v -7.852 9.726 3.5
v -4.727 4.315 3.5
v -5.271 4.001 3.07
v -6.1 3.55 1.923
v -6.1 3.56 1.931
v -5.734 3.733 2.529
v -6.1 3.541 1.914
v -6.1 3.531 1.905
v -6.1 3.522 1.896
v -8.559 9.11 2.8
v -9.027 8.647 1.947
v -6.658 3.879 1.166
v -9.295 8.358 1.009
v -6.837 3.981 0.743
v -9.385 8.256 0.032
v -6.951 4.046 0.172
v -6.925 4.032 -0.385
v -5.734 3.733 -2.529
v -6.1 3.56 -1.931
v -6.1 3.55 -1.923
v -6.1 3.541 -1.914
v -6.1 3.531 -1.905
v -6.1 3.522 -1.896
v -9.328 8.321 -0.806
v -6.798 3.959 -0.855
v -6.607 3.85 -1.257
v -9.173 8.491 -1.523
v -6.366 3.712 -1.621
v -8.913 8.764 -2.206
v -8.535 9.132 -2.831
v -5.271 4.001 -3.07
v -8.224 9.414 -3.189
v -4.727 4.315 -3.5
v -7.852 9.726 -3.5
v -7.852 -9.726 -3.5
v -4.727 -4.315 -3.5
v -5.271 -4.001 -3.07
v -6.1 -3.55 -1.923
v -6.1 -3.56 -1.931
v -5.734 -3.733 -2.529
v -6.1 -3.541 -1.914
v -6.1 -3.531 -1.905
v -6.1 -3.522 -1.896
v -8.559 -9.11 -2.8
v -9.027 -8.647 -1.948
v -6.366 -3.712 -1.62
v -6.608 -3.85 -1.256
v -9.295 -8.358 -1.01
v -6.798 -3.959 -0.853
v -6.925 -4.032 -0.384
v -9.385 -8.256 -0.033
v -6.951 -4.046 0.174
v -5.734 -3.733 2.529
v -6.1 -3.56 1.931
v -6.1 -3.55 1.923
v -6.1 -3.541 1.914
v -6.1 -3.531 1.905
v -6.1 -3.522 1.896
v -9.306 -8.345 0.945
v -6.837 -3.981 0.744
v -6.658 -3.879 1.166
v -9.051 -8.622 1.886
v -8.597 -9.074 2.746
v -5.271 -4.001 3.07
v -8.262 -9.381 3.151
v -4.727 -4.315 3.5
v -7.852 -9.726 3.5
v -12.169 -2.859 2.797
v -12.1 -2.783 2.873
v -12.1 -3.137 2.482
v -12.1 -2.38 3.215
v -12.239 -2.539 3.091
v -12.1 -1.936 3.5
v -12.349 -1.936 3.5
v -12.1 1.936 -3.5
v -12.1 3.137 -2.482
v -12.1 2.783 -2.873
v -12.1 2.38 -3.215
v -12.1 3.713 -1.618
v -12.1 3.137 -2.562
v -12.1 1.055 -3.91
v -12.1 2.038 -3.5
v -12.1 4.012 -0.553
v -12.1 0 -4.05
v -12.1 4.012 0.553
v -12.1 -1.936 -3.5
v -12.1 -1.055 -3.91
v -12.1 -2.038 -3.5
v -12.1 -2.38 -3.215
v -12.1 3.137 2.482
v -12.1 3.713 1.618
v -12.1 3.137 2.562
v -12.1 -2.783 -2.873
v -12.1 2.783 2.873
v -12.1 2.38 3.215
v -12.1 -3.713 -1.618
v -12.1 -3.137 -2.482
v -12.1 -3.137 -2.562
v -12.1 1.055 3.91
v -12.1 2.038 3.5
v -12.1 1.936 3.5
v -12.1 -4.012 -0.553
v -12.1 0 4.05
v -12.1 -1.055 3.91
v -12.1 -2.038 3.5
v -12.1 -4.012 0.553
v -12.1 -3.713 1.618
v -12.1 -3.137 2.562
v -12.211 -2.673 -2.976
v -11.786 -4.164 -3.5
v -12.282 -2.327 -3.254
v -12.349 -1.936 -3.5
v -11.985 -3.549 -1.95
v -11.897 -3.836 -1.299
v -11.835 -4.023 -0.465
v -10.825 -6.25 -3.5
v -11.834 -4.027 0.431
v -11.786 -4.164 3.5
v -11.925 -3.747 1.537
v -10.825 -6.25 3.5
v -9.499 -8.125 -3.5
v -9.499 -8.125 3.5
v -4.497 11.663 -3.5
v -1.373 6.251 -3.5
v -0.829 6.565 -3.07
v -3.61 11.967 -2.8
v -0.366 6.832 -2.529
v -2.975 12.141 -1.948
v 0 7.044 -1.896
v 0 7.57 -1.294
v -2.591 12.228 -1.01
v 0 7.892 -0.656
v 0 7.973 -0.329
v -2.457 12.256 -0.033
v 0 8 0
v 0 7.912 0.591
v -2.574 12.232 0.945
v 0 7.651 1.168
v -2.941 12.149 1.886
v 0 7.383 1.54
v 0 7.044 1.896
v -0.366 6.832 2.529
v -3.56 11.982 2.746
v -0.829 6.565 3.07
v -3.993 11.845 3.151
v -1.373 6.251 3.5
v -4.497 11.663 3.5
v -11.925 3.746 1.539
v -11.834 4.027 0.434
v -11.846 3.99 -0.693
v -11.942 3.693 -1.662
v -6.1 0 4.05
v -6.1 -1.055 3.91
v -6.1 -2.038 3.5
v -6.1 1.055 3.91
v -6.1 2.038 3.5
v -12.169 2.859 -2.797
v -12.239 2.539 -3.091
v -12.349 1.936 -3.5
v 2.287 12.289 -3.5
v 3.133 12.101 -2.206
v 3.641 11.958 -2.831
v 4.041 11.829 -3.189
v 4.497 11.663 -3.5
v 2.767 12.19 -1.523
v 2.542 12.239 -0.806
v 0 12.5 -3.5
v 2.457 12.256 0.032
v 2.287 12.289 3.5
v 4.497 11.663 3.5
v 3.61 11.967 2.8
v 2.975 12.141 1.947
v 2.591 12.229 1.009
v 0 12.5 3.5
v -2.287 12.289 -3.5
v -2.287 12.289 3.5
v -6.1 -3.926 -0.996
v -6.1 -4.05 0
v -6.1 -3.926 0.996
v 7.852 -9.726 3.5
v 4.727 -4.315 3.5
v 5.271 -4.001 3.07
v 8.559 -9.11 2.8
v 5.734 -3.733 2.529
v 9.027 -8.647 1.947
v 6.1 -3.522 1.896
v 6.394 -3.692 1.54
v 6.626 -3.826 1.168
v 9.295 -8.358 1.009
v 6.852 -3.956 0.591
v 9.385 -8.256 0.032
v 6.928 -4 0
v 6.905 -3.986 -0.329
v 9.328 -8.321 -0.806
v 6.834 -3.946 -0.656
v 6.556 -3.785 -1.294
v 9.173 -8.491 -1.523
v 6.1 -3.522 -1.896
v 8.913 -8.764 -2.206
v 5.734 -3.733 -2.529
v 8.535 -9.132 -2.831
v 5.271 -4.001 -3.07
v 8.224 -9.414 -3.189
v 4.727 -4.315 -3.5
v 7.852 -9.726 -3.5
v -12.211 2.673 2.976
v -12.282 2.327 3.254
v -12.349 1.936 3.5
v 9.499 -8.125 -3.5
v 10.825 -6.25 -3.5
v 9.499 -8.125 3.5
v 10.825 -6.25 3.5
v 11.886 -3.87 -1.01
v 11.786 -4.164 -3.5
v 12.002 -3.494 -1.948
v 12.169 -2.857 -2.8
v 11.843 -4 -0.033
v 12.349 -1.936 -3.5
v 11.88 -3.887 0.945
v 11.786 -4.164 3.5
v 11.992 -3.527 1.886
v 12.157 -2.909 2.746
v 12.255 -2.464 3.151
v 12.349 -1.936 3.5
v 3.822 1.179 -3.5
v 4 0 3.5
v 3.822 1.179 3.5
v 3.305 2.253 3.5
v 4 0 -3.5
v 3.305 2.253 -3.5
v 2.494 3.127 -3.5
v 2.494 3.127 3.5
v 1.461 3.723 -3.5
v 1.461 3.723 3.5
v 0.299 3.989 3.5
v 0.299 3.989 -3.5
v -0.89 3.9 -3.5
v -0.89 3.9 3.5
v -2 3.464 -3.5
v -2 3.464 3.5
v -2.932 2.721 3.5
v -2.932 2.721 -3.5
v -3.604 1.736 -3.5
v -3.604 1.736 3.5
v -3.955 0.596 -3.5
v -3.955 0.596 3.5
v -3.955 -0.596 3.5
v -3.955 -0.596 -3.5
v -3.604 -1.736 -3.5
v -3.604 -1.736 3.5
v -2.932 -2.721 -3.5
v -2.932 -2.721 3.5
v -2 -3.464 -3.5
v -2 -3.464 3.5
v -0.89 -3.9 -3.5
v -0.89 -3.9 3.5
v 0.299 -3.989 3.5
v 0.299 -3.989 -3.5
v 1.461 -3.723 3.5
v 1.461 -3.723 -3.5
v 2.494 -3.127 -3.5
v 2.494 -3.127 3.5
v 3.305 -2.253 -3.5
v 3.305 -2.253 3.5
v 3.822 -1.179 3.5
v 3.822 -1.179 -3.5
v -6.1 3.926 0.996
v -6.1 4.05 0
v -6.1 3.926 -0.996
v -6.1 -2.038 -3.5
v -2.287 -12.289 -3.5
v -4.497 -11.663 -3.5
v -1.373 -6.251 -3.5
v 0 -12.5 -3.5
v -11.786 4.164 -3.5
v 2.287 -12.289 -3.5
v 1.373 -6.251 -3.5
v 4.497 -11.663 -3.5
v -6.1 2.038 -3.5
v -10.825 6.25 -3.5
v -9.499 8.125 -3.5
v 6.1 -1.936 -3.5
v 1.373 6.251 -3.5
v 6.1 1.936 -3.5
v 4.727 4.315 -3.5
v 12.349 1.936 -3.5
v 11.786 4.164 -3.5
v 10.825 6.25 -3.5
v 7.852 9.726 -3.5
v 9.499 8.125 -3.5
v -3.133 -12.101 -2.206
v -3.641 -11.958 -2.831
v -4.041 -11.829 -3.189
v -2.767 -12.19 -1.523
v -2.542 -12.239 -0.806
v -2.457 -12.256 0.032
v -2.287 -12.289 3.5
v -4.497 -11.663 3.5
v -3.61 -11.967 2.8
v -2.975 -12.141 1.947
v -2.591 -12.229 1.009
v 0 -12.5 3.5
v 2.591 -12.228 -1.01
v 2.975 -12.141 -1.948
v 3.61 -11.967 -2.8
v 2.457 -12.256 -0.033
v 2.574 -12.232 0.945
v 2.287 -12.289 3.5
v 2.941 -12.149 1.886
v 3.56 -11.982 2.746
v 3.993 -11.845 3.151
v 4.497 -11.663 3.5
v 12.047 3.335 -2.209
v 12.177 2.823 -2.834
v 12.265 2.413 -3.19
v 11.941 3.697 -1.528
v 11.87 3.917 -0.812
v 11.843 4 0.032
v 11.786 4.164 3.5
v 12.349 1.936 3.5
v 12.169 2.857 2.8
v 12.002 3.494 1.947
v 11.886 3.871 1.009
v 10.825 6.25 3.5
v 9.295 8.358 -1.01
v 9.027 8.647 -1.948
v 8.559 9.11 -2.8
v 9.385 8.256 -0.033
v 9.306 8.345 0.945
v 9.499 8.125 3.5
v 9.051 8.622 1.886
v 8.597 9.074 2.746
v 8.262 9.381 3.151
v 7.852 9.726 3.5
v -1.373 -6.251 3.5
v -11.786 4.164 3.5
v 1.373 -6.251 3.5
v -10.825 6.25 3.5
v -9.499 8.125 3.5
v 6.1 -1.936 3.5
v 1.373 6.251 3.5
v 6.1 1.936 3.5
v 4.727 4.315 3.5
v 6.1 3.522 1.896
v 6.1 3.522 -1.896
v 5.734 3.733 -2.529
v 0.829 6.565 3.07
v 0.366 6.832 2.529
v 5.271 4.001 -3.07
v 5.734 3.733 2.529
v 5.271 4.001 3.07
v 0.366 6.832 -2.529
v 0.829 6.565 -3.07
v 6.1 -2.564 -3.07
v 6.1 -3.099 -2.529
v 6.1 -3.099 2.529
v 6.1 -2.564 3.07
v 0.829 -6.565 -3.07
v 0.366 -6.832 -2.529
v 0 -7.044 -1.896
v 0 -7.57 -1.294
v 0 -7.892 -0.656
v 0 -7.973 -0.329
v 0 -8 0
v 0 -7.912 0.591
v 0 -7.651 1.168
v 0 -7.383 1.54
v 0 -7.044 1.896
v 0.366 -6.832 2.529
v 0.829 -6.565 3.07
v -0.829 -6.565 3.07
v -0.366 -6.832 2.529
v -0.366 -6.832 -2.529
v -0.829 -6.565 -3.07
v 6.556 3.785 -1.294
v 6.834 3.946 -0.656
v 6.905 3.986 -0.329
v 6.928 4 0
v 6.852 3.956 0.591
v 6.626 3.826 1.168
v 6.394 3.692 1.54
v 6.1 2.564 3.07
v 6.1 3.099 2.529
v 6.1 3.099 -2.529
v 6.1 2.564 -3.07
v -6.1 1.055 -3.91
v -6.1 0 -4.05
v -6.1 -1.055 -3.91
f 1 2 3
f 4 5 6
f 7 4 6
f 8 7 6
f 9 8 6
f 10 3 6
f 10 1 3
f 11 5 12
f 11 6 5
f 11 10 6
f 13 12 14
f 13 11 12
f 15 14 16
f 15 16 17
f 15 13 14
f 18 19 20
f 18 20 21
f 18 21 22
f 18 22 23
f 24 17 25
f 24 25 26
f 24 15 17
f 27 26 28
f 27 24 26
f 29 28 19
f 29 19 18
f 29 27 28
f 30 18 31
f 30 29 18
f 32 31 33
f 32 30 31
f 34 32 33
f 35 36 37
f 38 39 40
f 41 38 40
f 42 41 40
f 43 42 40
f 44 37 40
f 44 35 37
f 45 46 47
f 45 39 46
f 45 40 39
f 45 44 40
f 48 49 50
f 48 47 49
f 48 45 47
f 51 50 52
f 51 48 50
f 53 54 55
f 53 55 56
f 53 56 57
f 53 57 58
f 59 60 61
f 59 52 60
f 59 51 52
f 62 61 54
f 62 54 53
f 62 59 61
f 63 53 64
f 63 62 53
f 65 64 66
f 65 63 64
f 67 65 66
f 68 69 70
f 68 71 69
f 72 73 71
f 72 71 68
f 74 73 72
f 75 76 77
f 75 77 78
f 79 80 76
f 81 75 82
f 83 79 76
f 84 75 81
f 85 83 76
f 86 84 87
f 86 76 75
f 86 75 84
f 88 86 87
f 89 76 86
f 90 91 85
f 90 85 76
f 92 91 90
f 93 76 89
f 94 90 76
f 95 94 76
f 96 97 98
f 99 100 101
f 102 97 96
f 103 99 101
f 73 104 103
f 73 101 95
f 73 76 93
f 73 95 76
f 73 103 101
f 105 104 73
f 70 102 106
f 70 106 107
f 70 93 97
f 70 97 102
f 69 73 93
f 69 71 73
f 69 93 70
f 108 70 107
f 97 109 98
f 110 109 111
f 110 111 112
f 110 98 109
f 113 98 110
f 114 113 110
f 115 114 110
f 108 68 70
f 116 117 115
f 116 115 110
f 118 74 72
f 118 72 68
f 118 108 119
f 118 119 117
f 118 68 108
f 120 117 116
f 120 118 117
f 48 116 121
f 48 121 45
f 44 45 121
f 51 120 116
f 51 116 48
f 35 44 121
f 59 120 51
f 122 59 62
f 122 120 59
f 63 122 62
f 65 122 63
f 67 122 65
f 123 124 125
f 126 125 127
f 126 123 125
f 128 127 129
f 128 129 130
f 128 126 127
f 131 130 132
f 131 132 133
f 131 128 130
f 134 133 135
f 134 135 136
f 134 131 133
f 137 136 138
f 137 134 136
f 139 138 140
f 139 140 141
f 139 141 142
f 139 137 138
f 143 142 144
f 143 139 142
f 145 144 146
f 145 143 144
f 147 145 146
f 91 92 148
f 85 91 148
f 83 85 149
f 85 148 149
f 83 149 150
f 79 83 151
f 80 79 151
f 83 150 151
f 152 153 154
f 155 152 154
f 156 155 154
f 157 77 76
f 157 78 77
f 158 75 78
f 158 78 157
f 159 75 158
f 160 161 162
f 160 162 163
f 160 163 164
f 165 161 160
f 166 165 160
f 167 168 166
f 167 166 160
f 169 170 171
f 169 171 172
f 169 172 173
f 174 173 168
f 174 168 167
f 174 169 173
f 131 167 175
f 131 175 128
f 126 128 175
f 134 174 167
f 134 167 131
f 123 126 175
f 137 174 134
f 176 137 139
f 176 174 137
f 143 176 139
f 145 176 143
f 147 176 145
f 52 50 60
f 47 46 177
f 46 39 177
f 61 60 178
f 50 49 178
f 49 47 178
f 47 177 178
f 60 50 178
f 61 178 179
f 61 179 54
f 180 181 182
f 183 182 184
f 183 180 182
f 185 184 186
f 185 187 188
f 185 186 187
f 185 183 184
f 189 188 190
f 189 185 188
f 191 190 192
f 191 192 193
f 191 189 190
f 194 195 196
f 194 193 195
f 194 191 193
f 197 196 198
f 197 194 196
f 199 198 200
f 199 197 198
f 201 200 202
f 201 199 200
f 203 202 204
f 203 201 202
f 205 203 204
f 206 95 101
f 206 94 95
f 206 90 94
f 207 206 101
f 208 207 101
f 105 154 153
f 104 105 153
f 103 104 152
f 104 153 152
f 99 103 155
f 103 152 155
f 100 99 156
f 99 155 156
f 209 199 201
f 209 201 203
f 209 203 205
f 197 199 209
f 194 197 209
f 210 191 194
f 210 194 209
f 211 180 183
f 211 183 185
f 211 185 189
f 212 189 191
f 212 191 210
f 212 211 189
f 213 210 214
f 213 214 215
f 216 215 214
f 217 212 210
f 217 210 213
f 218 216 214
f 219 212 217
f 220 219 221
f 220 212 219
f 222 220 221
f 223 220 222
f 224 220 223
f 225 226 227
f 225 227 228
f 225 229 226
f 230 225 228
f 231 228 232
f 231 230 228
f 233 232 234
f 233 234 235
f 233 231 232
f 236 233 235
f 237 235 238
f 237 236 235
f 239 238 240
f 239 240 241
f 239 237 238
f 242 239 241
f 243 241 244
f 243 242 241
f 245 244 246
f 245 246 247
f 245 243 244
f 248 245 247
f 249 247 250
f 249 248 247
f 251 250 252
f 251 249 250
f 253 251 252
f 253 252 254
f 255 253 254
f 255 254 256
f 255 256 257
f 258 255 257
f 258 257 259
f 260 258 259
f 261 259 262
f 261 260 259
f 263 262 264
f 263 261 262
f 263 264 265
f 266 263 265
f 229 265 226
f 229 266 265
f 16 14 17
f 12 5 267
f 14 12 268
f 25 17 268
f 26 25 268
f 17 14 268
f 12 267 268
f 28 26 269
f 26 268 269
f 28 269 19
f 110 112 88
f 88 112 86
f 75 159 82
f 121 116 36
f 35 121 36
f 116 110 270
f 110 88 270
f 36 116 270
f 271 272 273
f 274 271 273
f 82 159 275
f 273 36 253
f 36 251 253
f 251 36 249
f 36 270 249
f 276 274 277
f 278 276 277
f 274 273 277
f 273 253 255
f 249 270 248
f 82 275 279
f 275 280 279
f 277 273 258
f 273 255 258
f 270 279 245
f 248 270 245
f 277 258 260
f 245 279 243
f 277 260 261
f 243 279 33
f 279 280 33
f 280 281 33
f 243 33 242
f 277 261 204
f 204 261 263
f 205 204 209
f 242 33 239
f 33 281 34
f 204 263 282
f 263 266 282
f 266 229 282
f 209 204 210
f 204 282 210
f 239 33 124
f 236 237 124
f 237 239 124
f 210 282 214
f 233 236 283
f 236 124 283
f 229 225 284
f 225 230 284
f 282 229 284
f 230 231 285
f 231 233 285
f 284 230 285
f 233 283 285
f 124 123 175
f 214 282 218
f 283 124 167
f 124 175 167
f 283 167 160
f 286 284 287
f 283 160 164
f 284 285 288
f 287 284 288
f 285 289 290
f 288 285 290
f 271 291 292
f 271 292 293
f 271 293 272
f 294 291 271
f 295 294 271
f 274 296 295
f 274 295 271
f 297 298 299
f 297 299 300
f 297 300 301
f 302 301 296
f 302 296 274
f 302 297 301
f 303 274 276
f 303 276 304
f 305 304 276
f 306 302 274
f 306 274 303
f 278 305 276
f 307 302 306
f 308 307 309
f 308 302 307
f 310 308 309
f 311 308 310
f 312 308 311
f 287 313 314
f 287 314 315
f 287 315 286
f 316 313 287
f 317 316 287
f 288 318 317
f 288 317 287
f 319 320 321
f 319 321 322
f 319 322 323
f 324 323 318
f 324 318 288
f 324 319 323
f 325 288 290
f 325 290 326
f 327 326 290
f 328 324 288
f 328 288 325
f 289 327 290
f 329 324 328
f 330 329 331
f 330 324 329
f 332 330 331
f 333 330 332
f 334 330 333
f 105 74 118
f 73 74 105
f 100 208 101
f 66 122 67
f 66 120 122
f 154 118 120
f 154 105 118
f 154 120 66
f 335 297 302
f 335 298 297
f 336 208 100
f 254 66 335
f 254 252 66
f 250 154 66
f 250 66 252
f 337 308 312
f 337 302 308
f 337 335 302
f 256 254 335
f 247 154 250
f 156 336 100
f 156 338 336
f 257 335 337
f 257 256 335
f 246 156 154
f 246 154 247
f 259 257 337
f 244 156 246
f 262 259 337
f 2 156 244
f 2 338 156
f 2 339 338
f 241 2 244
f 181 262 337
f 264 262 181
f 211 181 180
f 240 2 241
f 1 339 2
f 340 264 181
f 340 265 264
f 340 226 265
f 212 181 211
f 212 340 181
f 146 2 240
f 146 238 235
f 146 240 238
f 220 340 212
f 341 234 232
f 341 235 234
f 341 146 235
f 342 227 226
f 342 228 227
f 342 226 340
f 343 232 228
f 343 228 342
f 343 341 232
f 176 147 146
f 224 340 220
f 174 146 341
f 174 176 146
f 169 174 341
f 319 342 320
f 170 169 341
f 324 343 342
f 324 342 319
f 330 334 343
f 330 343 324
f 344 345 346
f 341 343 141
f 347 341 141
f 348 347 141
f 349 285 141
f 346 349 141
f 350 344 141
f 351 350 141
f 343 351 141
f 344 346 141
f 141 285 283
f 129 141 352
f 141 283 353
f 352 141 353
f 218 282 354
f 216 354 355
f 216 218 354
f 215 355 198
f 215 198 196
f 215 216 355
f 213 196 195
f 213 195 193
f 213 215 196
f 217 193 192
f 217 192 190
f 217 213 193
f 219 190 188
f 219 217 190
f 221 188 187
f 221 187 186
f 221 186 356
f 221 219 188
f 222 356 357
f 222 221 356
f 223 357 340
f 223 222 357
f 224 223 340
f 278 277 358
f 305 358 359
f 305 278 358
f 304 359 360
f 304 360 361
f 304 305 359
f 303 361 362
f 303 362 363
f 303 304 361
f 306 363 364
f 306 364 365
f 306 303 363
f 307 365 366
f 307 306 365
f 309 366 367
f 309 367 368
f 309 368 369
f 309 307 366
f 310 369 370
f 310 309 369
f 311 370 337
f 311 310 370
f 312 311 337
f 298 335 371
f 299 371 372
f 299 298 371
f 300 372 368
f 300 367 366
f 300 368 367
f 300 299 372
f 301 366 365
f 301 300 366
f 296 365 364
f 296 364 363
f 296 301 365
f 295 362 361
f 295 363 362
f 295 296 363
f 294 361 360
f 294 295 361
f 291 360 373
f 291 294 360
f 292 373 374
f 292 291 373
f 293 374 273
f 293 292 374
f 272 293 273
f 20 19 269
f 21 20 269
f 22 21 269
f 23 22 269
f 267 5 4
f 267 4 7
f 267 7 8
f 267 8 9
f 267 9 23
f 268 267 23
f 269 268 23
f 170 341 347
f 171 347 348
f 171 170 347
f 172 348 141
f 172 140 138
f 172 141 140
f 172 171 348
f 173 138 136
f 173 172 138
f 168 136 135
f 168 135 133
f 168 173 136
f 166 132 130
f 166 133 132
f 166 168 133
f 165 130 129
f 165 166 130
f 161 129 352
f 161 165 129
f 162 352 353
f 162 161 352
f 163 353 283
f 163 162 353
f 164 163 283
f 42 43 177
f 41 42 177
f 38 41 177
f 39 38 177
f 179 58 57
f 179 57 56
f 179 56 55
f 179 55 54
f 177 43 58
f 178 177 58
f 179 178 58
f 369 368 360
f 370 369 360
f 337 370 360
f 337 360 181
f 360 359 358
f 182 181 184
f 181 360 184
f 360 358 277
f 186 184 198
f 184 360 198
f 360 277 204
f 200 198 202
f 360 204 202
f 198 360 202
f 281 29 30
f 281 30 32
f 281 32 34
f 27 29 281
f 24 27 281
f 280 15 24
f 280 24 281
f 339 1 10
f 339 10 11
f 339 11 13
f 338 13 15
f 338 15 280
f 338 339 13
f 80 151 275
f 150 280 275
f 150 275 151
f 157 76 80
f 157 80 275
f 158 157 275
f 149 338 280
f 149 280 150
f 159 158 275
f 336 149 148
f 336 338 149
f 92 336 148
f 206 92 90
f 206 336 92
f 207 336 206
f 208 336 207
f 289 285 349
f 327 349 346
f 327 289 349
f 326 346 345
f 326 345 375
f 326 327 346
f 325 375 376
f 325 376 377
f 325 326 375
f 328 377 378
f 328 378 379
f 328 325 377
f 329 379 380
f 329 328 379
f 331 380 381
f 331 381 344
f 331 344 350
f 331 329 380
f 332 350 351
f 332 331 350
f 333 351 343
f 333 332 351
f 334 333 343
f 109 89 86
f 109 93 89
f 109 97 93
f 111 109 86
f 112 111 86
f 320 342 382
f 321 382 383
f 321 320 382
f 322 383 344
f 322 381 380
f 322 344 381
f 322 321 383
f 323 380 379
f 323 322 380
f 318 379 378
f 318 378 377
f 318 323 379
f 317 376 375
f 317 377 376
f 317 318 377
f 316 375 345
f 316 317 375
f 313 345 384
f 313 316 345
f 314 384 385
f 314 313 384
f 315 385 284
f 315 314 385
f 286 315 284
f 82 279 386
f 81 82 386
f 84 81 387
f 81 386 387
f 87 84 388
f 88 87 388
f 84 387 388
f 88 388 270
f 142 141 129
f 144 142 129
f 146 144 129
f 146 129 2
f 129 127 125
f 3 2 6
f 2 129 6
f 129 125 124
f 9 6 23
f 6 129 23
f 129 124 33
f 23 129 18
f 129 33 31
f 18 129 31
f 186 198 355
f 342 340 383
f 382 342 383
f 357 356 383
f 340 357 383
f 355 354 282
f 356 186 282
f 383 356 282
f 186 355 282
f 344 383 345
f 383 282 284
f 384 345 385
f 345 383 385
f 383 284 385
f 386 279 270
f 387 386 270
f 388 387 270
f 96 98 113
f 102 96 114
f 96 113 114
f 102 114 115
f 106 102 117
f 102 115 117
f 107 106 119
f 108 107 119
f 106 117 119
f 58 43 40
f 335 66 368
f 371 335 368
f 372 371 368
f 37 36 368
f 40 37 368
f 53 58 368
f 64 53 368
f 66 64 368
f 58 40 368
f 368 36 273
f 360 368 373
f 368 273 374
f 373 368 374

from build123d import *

# Parameters (mm, degrees)
SKETCH1_R           = 12.5
SKETCH1_R_2         = 4
BOSS_EXTRUDE1_DEPTH = 3.5
SKETCH2_R           = 4
CUT_EXTRUDE3_DEPTH  = 6.4
CIRPATTERN1_COUNT   = 6
SKETCH3_R           = 4.05
BOSS_EXTRUDE2_DEPTH = 6


with BuildPart() as part:
    # Sketch1 → Boss-Extrude1 (new, symmetric)
    with BuildSketch(Plane.XY):
        Circle(SKETCH1_R)
        Circle(SKETCH1_R_2, mode=Mode.SUBTRACT)
    extrude(amount=BOSS_EXTRUDE1_DEPTH, both=True)

    # Sketch2 → Cut-Extrude3 (cut)
    with BuildSketch(Plane(origin=(-12.5, -17.193061184, 0), x_dir=(0, -1, 0), z_dir=(1, 0, 0))):
        with Locations((-17.193061184, 0)):
            Circle(SKETCH2_R)
    cut_extrude3 = extrude(amount=CUT_EXTRUDE3_DEPTH, mode=Mode.SUBTRACT)

    # CirPattern1: Cut-Extrude3 ×6 about axis
    cirpattern1_axis = Axis((0, 0, 3.5), (0, 0, 1))
    for i in range(1, CIRPATTERN1_COUNT):
        add(cut_extrude3.rotate(cirpattern1_axis, i * 360 / CIRPATTERN1_COUNT), mode=Mode.SUBTRACT)

    # Sketch3 → Boss-Extrude2 (add)
    with BuildSketch(Plane(origin=(-6.1, 0, 0), x_dir=(0, -1, 0), z_dir=(-1, 0, 0))):
        Circle(SKETCH3_R)
    extrude(amount=BOSS_EXTRUDE2_DEPTH)


solid = part.part
